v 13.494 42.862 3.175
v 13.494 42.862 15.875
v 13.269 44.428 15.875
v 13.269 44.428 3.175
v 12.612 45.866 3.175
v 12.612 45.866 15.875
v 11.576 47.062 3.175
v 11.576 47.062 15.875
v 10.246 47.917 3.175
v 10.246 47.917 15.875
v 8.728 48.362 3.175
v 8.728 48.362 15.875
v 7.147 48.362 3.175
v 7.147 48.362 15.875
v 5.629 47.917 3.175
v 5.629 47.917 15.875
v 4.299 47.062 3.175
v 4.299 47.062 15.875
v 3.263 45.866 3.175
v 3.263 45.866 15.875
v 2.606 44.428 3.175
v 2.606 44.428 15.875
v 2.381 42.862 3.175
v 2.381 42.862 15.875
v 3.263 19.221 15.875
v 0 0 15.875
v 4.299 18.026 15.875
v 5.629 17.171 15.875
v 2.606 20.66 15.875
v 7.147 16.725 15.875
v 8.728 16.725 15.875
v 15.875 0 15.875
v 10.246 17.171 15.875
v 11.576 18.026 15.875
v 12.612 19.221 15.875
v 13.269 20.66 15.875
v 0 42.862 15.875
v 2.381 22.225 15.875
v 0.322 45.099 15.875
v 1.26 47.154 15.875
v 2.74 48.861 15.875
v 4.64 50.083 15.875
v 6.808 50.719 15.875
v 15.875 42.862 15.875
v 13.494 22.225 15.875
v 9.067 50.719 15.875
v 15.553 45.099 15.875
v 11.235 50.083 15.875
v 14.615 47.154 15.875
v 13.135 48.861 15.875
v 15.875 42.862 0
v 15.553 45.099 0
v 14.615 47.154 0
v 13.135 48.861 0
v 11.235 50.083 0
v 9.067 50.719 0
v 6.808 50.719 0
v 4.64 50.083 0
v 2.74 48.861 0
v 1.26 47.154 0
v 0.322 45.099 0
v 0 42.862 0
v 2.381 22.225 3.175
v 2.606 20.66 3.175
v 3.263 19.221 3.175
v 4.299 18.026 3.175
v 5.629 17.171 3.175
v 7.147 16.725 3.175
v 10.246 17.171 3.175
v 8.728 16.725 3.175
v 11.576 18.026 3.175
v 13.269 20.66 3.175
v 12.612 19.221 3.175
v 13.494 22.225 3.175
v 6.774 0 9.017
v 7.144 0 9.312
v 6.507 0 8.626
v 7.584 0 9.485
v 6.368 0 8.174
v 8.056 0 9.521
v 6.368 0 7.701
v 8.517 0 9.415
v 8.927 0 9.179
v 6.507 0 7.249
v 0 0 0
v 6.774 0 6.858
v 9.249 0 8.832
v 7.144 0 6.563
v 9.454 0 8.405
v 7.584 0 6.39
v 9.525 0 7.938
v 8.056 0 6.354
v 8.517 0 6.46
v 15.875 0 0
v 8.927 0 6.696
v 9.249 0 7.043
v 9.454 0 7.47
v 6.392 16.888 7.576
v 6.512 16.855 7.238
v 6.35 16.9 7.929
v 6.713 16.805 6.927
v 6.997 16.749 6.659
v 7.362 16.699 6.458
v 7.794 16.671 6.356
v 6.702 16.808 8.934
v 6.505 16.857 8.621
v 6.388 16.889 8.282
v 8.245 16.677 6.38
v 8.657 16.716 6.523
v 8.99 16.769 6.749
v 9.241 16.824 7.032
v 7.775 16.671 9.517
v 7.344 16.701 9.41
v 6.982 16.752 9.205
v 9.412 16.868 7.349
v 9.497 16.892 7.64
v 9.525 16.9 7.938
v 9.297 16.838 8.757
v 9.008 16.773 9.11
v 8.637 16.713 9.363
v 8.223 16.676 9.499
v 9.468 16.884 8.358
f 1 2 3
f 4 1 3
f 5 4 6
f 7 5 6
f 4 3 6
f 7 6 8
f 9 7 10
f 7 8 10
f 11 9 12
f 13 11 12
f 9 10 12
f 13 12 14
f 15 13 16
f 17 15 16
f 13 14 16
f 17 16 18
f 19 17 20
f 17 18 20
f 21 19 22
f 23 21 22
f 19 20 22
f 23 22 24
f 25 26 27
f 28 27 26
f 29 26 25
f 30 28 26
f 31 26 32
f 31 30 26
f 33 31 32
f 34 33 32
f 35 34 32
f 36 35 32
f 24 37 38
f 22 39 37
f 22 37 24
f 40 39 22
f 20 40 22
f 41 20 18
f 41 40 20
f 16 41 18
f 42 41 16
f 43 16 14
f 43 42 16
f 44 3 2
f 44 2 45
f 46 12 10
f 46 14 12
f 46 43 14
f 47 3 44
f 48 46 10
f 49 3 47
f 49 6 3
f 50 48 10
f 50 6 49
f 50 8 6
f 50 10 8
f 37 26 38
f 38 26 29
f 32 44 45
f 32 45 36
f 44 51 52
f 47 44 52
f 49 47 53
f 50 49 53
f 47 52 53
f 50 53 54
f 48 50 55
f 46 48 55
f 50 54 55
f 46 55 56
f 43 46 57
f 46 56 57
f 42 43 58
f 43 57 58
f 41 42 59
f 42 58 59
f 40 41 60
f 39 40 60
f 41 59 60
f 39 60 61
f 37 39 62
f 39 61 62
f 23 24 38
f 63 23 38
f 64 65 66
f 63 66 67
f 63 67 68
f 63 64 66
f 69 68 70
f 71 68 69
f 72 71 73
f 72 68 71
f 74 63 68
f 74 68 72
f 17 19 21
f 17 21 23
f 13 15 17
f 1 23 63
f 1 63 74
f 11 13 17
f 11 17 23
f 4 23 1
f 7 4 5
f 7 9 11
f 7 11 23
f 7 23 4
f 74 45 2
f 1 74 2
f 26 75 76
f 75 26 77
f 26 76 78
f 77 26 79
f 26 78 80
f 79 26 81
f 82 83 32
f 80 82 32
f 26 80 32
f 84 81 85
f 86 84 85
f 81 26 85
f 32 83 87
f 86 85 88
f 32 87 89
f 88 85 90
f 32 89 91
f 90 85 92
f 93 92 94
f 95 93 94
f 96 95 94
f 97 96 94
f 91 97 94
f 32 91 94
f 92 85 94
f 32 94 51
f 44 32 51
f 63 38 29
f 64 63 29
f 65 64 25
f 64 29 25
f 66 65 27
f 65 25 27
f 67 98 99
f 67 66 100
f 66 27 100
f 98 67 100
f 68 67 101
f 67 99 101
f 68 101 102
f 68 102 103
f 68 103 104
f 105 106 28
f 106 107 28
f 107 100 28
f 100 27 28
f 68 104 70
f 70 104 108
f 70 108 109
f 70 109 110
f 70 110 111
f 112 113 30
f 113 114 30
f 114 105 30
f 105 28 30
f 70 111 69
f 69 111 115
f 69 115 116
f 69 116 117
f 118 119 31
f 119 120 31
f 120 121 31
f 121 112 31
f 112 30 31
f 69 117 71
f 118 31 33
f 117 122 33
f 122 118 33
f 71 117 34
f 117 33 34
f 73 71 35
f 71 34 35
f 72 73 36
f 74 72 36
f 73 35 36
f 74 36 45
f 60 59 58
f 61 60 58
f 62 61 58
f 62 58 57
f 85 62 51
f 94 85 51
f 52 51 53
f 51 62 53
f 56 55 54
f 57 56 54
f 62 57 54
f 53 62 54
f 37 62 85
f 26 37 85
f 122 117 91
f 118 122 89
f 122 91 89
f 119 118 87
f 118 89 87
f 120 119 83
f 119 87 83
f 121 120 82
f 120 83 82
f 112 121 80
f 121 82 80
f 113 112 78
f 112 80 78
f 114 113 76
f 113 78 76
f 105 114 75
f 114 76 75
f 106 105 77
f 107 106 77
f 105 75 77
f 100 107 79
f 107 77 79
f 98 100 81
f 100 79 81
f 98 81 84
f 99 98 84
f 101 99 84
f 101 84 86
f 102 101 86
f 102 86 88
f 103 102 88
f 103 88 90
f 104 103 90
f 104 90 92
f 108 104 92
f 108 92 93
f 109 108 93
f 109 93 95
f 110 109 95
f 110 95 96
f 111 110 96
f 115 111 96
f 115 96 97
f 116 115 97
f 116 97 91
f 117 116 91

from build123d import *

# Parameters (mm, degrees)
F1_DEPTH = 15.875
F3_DEPTH = 12.7
F4_R     = 1.5875
F5_DEPTH = 17.9003632286


with BuildPart() as f1:
    # F0 (on Top) → F1 (new body)
    with BuildSketch(Plane.XY):
        with BuildLine():
            Line((0, 42.8625), (0, 0))
            Line((0, 0), (15.875, 0))
            Line((15.875, 0), (15.875, 42.8625))
            ThreePointArc((15.875, 42.8625), (7.9375, 50.8), (0, 42.8625))
        make_face()
    extrude(amount=F1_DEPTH)

    # F2 (on face) → F3 (cut)
    with BuildSketch(Plane.XY.offset(15.875)):
        with BuildLine():
            Line((2.38125, 42.8625), (2.38125, 22.225))
            ThreePointArc((2.38125, 22.225), (7.9375, 16.66875), (13.49375, 22.225))
            Line((13.49375, 22.225), (13.49375, 42.8625))
            ThreePointArc((13.49375, 42.8625), (7.9375, 48.41875), (2.38125, 42.8625))
        make_face()
    extrude(amount=-F3_DEPTH, mode=Mode.SUBTRACT)

    # F4 (on face) → F5 (cut, up to face)
    with BuildSketch(Plane.XZ):
        with Locations((7.9375, 7.9375)):
            Circle(F4_R)
    extrude(amount=-F5_DEPTH, mode=Mode.SUBTRACT)


solid = f1.part
